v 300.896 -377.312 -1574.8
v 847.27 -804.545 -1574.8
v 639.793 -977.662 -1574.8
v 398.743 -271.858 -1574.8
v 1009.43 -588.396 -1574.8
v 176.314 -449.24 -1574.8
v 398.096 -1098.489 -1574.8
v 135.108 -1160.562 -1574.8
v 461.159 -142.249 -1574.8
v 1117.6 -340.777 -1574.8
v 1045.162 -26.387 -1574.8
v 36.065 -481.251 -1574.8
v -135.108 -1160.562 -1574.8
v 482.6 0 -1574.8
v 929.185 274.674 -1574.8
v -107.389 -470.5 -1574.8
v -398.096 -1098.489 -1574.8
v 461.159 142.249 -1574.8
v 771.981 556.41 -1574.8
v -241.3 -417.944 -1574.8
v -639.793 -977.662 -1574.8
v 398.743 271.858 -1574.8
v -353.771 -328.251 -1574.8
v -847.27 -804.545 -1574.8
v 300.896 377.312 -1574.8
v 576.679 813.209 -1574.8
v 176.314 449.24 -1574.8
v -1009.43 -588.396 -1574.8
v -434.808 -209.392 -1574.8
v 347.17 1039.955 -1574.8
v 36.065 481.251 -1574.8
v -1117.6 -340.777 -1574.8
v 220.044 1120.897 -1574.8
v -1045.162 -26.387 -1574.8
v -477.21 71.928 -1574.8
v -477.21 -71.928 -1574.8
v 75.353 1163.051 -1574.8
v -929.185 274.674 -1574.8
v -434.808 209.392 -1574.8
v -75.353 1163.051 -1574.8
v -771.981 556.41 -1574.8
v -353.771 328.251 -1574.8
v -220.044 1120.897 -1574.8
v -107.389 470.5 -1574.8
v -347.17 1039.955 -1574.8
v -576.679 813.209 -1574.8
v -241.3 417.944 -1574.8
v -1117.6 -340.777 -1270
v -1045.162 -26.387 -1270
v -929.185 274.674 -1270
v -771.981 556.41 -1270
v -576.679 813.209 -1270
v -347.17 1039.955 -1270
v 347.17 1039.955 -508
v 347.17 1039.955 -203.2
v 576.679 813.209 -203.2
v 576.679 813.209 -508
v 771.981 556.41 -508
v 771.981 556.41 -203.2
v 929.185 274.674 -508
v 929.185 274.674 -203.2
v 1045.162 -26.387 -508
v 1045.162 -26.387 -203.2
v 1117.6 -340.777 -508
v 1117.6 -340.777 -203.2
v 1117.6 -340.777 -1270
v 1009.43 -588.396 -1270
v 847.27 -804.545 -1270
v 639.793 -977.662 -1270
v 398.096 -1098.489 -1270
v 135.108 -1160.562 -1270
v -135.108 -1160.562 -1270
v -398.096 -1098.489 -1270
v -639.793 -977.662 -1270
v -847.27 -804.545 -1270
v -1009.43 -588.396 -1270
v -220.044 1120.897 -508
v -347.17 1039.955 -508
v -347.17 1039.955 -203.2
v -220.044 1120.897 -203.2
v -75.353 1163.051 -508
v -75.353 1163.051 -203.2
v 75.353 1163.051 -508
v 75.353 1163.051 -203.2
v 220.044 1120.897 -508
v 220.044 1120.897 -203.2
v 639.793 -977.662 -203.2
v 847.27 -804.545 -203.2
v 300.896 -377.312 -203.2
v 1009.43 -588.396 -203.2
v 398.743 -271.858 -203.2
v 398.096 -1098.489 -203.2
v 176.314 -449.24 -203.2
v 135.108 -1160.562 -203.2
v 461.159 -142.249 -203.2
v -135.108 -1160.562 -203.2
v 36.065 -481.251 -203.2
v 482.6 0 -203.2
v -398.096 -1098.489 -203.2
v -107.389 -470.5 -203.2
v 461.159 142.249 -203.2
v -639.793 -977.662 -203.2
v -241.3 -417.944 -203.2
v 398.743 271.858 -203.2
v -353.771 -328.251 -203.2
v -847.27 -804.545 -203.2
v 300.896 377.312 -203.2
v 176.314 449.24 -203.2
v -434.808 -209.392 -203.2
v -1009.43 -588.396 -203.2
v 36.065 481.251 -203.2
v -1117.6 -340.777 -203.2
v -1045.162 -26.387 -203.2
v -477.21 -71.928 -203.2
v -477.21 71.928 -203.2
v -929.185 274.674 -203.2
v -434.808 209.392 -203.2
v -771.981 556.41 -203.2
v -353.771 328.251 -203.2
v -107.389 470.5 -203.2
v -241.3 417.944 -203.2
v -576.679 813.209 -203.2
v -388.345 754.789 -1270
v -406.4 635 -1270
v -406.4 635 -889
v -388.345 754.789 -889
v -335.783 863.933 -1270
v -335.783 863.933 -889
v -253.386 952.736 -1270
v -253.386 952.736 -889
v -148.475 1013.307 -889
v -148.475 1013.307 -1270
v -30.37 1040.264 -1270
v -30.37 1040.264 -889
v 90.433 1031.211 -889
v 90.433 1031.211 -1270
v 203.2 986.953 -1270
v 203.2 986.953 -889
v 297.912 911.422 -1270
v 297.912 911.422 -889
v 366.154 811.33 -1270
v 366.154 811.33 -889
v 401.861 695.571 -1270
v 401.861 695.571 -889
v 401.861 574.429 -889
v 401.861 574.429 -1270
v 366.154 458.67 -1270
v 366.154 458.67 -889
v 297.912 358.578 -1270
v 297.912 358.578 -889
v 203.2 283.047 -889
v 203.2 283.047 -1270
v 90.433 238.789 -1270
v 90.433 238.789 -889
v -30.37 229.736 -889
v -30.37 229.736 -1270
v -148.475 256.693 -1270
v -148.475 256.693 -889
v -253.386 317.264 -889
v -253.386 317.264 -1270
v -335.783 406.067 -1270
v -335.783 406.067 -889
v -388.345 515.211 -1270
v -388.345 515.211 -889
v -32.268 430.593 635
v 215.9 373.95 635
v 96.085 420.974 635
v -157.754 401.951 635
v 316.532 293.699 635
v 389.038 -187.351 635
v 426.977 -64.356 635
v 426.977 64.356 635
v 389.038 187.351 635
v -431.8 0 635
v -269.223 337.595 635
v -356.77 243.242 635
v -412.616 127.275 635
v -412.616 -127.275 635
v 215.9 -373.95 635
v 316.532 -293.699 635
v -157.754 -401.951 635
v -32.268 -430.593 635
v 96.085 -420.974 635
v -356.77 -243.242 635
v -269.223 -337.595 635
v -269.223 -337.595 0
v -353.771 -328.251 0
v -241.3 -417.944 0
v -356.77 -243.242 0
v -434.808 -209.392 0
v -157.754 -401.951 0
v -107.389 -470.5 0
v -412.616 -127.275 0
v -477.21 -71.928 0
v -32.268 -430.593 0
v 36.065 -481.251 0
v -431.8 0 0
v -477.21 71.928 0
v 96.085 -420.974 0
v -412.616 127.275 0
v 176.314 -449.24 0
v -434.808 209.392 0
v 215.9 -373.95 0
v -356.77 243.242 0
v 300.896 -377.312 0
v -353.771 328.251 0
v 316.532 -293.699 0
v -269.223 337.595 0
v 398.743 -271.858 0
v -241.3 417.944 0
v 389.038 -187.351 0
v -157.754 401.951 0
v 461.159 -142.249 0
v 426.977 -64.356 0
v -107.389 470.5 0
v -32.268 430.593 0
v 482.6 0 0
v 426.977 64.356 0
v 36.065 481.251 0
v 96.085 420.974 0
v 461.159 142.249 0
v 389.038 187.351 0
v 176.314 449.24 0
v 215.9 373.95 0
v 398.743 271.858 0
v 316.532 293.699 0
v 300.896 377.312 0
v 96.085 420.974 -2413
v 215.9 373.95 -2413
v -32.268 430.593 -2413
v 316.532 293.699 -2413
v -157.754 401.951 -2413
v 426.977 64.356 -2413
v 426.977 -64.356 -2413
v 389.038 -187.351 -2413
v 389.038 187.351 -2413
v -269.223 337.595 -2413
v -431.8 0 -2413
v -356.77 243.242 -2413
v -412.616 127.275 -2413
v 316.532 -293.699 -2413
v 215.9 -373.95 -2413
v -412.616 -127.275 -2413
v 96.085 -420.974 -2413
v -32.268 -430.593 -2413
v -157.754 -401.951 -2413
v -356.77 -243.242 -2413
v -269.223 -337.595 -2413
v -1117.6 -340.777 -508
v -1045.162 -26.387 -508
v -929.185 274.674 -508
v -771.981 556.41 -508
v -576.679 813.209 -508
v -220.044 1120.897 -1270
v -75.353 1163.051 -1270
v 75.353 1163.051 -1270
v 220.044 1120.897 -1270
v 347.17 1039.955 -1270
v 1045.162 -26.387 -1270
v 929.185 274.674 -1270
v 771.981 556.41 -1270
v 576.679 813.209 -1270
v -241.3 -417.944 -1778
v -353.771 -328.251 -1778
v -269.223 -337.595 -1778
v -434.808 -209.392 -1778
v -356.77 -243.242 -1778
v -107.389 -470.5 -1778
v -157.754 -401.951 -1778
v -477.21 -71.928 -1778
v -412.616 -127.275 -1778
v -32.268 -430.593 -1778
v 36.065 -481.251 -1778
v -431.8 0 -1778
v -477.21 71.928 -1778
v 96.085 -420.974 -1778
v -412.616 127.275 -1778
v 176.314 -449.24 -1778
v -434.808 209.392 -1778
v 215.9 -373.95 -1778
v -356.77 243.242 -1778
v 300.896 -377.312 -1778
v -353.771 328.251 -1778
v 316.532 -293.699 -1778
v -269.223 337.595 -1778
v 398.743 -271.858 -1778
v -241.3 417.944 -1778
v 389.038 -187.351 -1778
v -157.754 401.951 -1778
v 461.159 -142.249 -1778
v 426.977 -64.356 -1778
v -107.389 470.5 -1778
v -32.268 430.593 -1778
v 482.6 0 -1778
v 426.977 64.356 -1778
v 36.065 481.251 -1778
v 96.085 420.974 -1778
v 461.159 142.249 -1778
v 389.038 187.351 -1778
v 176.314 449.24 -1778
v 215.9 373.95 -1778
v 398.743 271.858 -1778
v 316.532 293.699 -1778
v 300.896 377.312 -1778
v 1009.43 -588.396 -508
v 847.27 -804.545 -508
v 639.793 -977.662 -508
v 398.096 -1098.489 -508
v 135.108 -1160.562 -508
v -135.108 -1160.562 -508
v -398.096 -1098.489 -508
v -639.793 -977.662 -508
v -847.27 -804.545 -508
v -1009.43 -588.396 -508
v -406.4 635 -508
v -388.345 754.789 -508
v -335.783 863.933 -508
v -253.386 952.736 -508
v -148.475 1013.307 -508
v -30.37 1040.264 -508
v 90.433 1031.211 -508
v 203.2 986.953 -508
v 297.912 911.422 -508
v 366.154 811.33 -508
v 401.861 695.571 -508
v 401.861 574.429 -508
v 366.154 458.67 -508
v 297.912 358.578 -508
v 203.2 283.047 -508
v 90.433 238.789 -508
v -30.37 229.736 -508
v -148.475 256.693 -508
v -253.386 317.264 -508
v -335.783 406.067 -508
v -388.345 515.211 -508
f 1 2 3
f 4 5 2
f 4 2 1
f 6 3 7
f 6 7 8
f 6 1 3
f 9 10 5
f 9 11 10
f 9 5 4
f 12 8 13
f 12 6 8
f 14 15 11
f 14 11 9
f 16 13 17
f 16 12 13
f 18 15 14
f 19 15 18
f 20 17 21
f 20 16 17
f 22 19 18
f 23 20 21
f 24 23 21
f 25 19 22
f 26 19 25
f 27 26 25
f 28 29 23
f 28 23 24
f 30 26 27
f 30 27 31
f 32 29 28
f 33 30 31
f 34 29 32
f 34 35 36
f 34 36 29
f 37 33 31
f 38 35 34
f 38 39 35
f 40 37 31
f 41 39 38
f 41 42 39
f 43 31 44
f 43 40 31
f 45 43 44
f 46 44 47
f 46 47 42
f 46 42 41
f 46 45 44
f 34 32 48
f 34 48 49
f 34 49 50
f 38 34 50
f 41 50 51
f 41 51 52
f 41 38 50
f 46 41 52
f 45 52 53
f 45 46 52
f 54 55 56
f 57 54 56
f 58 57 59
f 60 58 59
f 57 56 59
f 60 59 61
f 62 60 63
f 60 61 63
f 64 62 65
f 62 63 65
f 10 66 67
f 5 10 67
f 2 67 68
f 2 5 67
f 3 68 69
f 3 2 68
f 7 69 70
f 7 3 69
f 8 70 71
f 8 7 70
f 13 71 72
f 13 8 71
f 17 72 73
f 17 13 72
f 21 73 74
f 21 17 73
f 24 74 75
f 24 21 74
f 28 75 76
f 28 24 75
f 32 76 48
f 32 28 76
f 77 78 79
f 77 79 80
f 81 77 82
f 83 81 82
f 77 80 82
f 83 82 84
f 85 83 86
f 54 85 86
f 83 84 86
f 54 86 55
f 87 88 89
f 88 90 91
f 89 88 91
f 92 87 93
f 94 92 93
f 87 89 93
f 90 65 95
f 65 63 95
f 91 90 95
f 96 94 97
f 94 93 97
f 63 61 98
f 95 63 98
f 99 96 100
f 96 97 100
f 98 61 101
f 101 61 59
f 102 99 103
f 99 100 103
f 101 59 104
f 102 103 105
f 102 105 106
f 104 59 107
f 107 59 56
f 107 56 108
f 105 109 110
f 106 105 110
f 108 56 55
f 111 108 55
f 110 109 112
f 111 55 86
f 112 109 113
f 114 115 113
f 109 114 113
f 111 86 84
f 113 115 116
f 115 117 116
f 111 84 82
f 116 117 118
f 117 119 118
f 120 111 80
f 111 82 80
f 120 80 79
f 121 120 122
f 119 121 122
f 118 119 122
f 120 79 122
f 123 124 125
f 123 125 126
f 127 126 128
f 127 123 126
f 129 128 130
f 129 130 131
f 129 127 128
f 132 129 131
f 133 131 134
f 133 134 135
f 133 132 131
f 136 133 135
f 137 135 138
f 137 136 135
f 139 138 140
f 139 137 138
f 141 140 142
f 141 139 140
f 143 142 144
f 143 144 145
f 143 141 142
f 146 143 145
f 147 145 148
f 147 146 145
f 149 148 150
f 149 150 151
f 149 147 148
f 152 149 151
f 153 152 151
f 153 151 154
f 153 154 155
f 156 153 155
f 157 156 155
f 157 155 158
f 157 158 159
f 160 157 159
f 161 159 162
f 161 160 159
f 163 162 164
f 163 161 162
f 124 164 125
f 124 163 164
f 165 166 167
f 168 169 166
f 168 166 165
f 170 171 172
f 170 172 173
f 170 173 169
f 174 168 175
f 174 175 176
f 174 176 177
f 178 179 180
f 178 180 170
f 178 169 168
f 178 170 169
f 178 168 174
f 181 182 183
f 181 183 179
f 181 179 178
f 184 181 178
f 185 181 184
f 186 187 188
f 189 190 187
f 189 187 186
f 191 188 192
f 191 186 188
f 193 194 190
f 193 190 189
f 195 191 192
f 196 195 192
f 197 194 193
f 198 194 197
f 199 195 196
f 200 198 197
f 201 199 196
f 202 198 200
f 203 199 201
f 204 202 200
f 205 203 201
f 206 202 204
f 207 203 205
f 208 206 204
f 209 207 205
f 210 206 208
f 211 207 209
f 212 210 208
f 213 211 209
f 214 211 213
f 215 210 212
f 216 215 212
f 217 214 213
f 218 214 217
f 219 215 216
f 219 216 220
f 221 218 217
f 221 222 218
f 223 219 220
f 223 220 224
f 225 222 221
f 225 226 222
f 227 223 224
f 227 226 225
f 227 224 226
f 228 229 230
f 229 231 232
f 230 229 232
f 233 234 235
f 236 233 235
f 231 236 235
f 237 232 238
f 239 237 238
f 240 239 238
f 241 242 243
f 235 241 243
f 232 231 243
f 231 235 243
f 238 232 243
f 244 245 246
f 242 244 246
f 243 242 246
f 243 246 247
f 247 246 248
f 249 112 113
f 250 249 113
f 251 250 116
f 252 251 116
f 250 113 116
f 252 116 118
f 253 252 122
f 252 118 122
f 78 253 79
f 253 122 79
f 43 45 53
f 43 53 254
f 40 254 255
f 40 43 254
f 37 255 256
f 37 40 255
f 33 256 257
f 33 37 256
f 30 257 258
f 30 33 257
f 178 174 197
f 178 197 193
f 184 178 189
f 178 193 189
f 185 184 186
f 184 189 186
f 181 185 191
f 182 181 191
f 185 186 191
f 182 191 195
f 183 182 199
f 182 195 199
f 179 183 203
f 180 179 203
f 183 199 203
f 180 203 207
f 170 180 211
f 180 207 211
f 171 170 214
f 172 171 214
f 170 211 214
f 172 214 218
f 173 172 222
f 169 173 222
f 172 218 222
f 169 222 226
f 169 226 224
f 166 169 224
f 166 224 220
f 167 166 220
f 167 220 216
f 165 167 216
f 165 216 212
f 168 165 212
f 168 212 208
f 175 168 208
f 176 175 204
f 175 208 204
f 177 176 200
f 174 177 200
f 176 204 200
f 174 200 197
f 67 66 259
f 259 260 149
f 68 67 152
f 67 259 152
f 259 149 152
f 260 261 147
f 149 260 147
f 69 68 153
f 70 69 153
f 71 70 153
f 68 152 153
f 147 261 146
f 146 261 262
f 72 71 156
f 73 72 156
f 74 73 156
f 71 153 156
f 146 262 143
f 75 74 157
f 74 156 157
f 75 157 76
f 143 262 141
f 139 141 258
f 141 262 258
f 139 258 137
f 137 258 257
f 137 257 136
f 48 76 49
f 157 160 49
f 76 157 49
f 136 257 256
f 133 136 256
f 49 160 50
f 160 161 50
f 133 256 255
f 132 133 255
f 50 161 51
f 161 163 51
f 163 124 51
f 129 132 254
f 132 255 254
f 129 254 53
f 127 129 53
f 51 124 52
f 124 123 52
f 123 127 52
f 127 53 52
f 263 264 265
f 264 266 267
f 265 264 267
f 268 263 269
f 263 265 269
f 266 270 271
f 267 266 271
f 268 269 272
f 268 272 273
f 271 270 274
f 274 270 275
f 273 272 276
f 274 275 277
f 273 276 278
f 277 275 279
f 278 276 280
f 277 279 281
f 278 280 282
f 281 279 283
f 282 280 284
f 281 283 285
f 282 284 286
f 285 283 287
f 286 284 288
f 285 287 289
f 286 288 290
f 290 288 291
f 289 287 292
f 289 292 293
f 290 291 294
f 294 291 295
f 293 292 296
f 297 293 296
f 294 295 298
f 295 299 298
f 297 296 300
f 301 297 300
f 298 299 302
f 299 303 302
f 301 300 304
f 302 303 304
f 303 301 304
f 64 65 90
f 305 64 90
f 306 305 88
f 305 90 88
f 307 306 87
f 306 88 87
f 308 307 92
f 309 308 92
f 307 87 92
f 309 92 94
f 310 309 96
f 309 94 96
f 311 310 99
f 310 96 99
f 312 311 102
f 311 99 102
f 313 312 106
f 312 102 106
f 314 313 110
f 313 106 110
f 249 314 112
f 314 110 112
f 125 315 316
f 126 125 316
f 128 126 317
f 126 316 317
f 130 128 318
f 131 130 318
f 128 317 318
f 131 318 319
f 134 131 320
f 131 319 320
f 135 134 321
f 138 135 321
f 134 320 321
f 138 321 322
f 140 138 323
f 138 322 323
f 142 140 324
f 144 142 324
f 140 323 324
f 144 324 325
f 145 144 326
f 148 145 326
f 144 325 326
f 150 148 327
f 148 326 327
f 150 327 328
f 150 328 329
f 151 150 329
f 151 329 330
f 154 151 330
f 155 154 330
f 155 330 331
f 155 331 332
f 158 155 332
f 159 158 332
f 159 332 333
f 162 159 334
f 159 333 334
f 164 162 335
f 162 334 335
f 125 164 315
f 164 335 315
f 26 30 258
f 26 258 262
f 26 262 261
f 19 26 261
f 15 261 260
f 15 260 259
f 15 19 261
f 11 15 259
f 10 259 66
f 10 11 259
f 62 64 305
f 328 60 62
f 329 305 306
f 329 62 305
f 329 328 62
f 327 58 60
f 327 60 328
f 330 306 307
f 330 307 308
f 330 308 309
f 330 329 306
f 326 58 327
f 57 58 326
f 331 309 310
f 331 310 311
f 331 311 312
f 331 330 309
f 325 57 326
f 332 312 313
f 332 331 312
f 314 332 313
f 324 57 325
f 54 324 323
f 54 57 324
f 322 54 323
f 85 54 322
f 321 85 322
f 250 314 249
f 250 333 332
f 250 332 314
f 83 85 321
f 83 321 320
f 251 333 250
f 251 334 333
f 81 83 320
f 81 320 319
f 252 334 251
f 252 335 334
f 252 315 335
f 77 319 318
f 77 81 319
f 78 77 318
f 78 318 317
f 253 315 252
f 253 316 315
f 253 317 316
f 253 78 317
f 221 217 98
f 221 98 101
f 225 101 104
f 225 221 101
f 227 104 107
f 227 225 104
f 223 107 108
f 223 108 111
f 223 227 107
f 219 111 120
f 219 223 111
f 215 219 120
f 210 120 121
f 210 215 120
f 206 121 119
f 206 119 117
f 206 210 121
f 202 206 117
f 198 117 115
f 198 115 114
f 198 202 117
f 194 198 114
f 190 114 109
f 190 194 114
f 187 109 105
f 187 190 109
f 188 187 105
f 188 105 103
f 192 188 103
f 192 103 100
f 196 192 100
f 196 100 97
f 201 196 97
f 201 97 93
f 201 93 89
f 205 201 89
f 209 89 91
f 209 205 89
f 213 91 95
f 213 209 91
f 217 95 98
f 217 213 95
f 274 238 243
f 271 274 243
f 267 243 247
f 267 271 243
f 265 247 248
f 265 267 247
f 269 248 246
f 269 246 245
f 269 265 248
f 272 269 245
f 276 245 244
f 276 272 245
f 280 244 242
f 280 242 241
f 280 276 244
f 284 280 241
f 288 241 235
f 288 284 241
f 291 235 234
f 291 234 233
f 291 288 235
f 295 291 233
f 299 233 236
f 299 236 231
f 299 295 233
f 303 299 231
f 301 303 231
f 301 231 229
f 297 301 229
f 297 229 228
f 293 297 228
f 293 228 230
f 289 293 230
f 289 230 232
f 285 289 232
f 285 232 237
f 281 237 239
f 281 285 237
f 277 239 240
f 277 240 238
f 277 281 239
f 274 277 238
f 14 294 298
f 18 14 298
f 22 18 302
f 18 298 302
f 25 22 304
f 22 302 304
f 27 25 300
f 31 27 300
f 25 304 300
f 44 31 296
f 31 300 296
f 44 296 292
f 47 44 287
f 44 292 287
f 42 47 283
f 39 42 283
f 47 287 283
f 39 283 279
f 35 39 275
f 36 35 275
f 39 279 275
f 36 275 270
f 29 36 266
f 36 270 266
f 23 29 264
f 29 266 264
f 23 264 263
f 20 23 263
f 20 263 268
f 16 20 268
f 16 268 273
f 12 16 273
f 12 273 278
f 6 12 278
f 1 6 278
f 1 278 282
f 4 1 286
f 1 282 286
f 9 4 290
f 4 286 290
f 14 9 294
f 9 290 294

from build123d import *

# Parameters (mm, degrees)
SKETCH1_R           = 431.8
BOSS_EXTRUDE1_DEPTH = 635
SKETCH2_R           = 482.6
BOSS_EXTRUDE2_DEPTH = 203.2
BOSS_EXTRUDE3_DEPTH = 304.8
SKETCH7_R           = 406.4
BOSS_EXTRUDE4_DEPTH = 381


with BuildPart() as part:
    # Sketch1 → Boss-Extrude1 (new body)
    with BuildSketch(Plane.XY):
        with Locations(Location((0, 0, 0), (0, 0, 180))):
            Circle(SKETCH1_R)
    extrude(amount=BOSS_EXTRUDE1_DEPTH)

    # Sketch2 → Boss-Extrude2 (add)
    with BuildSketch(Plane.XY):
        Circle(SKETCH2_R)
    extrude(amount=-BOSS_EXTRUDE2_DEPTH)

    # Sketch6 → Boss-Extrude3 (add)
    with BuildSketch(Plane(origin=(0, 0, -203.2), x_dir=(-1, 0, 0), z_dir=(0, 0, -1))):
        with BuildLine():
            ThreePointArc((-1117.6, -340.776759771), (0, -1168.4), (1117.6, -340.776759771))
            ThreePointArc((1117.6, -340.776759771), (855.559483917, 418.319143644), (347.169606843, 1039.955335913))
            ThreePointArc((347.169606843, 1039.955335913), (0, 1168.4), (-347.169606843, 1039.955335913))
            ThreePointArc((-347.169606843, 1039.955335913), (-855.559483917, 418.319143644), (-1117.6, -340.776759771))
        make_face()
    extrude(amount=BOSS_EXTRUDE3_DEPTH)

    # Sketch7 → Boss-Extrude4 (add)
    with BuildSketch(Plane(origin=(0, 0, -508), x_dir=(-1, 0, 0), z_dir=(0, 0, -1))):
        with Locations((0, 635)):
            Circle(SKETCH7_R)
    extrude(amount=BOSS_EXTRUDE4_DEPTH)

    # Mirror1: part across plane


with BuildPart() as part_1:
    add(part.part)
    add(part.part.mirror(Plane(origin=(0, 635, -889), x_dir=(1, 0, 0), z_dir=(0, 0, -1))))


solid = part_1.part
